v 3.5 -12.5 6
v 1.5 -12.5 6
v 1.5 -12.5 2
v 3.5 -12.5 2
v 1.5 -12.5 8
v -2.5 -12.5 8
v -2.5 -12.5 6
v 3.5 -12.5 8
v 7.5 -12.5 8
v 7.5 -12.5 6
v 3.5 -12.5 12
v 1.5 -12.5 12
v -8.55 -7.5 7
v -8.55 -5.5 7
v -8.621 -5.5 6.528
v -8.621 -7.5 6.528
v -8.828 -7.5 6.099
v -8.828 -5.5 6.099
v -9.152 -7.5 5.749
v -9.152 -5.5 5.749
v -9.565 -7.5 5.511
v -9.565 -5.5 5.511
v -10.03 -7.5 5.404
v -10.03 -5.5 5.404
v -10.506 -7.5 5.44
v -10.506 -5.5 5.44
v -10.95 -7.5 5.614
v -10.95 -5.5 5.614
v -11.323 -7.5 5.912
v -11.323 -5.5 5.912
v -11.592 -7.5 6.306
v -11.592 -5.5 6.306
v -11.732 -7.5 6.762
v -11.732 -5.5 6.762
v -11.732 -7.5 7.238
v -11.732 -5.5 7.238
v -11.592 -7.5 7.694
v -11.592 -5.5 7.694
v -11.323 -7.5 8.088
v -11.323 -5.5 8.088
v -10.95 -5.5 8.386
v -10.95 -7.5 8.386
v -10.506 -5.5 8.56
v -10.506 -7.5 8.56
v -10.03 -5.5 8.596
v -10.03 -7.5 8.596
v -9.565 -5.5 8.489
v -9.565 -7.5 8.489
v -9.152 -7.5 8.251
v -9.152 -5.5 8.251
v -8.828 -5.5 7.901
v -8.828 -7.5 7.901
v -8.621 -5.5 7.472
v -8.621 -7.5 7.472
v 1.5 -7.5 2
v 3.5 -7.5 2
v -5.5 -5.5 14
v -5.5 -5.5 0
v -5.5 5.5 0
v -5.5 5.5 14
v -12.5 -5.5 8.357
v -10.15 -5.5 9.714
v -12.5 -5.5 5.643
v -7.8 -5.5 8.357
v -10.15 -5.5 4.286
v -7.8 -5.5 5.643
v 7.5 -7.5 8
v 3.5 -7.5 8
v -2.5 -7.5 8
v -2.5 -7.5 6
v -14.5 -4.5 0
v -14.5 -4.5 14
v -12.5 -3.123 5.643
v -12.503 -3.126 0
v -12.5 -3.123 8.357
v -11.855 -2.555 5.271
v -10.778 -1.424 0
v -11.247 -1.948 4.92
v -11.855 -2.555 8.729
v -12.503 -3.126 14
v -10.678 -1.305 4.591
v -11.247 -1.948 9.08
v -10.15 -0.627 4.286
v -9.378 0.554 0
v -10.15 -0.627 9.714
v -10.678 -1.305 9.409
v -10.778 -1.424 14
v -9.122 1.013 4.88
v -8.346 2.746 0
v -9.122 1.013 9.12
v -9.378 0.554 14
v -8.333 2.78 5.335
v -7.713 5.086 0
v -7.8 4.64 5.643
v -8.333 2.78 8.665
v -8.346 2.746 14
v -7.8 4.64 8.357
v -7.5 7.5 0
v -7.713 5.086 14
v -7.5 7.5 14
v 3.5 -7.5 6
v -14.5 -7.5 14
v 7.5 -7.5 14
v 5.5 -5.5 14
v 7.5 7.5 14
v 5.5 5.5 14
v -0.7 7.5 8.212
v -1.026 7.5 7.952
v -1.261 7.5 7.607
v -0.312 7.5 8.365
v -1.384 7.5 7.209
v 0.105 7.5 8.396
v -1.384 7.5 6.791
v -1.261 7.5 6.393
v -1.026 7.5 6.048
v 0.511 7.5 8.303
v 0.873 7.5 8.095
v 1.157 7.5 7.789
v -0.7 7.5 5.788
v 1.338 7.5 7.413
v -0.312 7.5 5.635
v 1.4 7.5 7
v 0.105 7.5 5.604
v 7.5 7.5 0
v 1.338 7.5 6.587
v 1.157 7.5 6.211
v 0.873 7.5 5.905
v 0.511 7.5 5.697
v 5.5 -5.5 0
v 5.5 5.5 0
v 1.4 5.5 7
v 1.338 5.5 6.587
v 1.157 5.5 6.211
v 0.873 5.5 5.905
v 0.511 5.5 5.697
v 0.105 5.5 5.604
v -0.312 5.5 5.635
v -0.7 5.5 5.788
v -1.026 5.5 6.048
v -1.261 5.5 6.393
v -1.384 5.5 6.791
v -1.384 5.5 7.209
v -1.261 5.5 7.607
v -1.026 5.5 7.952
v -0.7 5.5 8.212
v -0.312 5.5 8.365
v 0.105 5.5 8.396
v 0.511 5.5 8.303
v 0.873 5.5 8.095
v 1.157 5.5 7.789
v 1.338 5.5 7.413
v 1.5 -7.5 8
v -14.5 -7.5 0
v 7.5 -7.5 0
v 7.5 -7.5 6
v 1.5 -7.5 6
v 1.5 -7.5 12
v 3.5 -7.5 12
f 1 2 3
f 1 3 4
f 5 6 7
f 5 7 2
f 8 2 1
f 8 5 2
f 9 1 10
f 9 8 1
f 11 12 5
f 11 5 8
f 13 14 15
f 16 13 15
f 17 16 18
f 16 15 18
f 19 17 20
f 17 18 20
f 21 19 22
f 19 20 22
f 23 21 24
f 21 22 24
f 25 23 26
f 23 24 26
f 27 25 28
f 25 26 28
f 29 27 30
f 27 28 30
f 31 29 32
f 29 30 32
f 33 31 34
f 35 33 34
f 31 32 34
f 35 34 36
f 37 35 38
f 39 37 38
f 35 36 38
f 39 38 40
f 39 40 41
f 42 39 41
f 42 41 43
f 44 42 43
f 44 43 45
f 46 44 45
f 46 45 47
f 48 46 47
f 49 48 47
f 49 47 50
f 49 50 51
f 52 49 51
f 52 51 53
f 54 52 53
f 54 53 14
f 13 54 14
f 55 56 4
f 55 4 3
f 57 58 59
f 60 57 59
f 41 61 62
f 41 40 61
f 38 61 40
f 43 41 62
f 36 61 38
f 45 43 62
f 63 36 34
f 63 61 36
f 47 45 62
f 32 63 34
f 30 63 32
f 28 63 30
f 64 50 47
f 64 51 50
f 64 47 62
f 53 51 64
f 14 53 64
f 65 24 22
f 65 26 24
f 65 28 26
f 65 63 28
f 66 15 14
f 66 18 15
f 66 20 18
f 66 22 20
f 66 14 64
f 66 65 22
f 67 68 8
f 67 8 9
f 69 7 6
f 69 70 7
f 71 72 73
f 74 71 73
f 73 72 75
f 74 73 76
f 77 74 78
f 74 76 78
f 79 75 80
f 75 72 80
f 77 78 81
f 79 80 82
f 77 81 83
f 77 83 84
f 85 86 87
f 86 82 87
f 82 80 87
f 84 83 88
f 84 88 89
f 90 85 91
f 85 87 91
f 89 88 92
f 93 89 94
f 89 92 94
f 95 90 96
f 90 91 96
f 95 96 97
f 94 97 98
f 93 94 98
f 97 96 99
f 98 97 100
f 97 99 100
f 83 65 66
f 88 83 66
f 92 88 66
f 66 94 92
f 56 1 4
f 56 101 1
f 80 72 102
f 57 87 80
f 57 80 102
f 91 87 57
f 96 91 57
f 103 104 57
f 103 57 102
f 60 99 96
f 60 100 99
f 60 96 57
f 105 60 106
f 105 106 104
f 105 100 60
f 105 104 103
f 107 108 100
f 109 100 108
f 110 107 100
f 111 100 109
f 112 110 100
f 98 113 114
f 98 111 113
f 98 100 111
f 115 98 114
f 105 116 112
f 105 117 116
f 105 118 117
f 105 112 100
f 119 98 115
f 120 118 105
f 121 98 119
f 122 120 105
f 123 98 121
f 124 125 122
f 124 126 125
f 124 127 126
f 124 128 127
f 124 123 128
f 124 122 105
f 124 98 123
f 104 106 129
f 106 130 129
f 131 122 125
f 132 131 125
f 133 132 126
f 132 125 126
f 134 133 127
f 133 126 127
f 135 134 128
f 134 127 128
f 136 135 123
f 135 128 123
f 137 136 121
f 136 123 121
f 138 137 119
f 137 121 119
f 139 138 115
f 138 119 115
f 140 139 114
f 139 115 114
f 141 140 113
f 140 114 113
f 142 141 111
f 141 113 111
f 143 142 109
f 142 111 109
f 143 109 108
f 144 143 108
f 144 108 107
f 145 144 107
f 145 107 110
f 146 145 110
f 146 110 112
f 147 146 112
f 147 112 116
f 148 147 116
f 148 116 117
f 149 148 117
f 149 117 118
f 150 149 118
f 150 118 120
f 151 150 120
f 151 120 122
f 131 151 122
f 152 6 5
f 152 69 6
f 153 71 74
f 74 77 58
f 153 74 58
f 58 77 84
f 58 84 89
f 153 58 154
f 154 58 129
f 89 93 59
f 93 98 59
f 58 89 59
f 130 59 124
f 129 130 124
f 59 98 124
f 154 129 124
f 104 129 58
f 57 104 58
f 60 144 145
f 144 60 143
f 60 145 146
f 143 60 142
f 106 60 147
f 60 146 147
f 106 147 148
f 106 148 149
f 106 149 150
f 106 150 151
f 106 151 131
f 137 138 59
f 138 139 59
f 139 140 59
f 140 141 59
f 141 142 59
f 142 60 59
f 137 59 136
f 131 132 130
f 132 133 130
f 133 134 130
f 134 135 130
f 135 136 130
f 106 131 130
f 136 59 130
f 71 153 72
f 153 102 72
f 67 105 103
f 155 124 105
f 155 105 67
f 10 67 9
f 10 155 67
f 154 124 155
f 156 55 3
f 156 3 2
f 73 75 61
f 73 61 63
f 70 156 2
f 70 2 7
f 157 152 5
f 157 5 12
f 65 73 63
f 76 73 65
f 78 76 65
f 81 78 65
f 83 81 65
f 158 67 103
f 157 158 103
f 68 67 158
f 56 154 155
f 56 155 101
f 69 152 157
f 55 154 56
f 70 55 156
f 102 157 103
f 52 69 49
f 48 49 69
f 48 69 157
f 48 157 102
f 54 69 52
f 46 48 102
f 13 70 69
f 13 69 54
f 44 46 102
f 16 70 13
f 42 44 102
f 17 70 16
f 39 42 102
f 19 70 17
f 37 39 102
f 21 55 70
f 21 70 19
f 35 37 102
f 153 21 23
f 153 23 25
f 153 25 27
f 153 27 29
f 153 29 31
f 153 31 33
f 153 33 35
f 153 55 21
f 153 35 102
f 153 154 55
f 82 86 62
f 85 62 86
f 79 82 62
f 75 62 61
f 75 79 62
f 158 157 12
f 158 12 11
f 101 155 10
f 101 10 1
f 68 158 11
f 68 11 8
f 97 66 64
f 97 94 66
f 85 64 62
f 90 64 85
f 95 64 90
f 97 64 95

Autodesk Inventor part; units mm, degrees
ref_plane "YZ Plane" through (0, 0, 0) normal (1, 0, 0) x (0, 1, 0)
ref_plane "XZ Plane" through (0, 0, 0) normal (0, 1, 0) x (-1, 0, 0)
ref_plane "XY Plane" through (0, 0, 0) normal (0, 0, 1) x (1, 0, 0)
sketch "スケッチ1" plane through (0, 0, 0) normal (0, 0, 1) x (1, 0, 0)
  line L0 (5.5, -5.5) -> (-5.5, -5.5)
  line L1 (-5.5, -5.5) -> (-5.5, 5.5)
  line L2 (-5.5, 5.5) -> (5.5, 5.5)
  line L3 (5.5, 5.5) -> (5.5, -5.5)
  line L4 (5.5, -5.5) -> (-5.5, 5.5) construction
  line L5 (-5.5, -5.5) -> (5.5, 5.5) construction
  line L6 (7.5, -7.5) -> (-7.5, -7.5)
  line L7 (-7.5, -7.5) -> (-7.5, 7.5)
  line L8 (-7.5, 7.5) -> (7.5, 7.5)
  line L9 (7.5, 7.5) -> (7.5, -7.5)
  line L10 (7.5, -7.5) -> (-7.5, 7.5) construction
  line L11 (-7.5, -7.5) -> (7.5, 7.5) construction
  point P0 (0, 0)
  dimension "d0" = 11
  dimension "d1" = 11
  dimension "d2" = 2
extrude "押し出し1" add sketch "スケッチ1" along normal blind 14
sketch "スケッチ2" plane through (0, 0, 14) normal (0, 0, 1) x (1, 0, 0)
  line L0 (-7.5, 7.5) -> (-7.5, -7.5) projected
  line L1 (-7.5, -7.5) -> (-14.5, -7.5)
  line L2 (-14.5, -7.5) -> (-14.5, -4.5)
  line L3 (-14.5, -4.5) -> (-7.5, -4.5)
  line L4 (-7.5, -4.5) -> (-7.5, -7.5)
  arc A0 (-14.5, -4.5) -> (-7.5, 7.5) centre (-21.2857, 7.5) ccw
  point P0 (0, 0)
  dimension "d5" = 7
  dimension "d6" = 3
extrude "押し出し2" add sketch "スケッチ2" against normal up to surface (14 mm away)
sketch "スケッチ3" plane through (7.5, 7.5, 14) normal (0, 1, 0) x (1, 0, 0)
  circle A0 centre (-7.5, 7) radius 1.4
  line L0 (0, 14) -> (0, 0) projected
  line L1 (0, 14) -> (-15, 14) projected
  point P0 (-7.5, 14)
  point P1 (0, 7)
  point P2 (-7.5, 14)
  dimension "d9" = 2.8
extrude "押し出し3" cut sketch "スケッチ3" against normal up to surface (2 mm away)
sketch "スケッチ4" plane through (7.5, -7.5, 0) normal (0, -1, 0) x (1, 0, 0)
  line L0 (-6, 12) -> (-4, 12)
  line L1 (-4, 12) -> (-4, 2)
  line L2 (-4, 2) -> (-6, 2)
  line L3 (-6, 2) -> (-6, 12)
  line L4 (-10, 8) -> (0, 8)
  line L5 (0, 8) -> (0, 6)
  line L6 (0, 6) -> (-10, 6)
  line L7 (-10, 6) -> (-10, 8)
  line L8 (0, 0) -> (0, 14) projected
  point P0 (-7.5, 0)
  point P1 (0, 7)
  point P2 (0, 7)
  point P3 (-5, 12)
  point P4 (-5, 8)
  point P5 (-6, 7)
  point P6 (-10, 7)
  point P7 (-6, 8)
  point P8 (-6, 6)
  point P9 (-4, 6)
  point P10 (-4, 8)
  dimension "d12" = 10
  dimension "d13" = 2
extrude "押し出し4" add sketch "スケッチ4" along normal blind 5
sketch "スケッチ5" plane through (7.5, 7.5, 14) normal (0, 1, 0) x (1, 0, 0)
  line L0 (-15.3, 8.3568) -> (-15.3, 5.6432)
  line L1 (-15.3, 5.6432) -> (-17.65, 4.2865)
  line L2 (-17.65, 4.2865) -> (-20, 5.6432)
  line L3 (-20, 5.6432) -> (-20, 8.3568)
  line L4 (-20, 8.3568) -> (-17.65, 9.7135)
  line L5 (-17.65, 9.7135) -> (-15.3, 8.3568)
  circle A0 centre (-17.65, 7) radius 1.6
  line L6 (-22, 0) -> (-22, 14) projected
  point P0 (-7.5, 14)
  point P1 (-20, 7)
  point P2 (-22, 7)
  dimension "d16" = 4.7
  dimension "d17" = 3.2
  dimension "d24" = 2
extrude "押し出し5" cut sketch "スケッチ5" against normal through all contours A0
extrude "押し出し6" cut sketch "スケッチ5" against normal up to surface (13 mm away) contours L0 L1 L2 L3 L4 L5 | A0
properties part number "position_setter_normal"
